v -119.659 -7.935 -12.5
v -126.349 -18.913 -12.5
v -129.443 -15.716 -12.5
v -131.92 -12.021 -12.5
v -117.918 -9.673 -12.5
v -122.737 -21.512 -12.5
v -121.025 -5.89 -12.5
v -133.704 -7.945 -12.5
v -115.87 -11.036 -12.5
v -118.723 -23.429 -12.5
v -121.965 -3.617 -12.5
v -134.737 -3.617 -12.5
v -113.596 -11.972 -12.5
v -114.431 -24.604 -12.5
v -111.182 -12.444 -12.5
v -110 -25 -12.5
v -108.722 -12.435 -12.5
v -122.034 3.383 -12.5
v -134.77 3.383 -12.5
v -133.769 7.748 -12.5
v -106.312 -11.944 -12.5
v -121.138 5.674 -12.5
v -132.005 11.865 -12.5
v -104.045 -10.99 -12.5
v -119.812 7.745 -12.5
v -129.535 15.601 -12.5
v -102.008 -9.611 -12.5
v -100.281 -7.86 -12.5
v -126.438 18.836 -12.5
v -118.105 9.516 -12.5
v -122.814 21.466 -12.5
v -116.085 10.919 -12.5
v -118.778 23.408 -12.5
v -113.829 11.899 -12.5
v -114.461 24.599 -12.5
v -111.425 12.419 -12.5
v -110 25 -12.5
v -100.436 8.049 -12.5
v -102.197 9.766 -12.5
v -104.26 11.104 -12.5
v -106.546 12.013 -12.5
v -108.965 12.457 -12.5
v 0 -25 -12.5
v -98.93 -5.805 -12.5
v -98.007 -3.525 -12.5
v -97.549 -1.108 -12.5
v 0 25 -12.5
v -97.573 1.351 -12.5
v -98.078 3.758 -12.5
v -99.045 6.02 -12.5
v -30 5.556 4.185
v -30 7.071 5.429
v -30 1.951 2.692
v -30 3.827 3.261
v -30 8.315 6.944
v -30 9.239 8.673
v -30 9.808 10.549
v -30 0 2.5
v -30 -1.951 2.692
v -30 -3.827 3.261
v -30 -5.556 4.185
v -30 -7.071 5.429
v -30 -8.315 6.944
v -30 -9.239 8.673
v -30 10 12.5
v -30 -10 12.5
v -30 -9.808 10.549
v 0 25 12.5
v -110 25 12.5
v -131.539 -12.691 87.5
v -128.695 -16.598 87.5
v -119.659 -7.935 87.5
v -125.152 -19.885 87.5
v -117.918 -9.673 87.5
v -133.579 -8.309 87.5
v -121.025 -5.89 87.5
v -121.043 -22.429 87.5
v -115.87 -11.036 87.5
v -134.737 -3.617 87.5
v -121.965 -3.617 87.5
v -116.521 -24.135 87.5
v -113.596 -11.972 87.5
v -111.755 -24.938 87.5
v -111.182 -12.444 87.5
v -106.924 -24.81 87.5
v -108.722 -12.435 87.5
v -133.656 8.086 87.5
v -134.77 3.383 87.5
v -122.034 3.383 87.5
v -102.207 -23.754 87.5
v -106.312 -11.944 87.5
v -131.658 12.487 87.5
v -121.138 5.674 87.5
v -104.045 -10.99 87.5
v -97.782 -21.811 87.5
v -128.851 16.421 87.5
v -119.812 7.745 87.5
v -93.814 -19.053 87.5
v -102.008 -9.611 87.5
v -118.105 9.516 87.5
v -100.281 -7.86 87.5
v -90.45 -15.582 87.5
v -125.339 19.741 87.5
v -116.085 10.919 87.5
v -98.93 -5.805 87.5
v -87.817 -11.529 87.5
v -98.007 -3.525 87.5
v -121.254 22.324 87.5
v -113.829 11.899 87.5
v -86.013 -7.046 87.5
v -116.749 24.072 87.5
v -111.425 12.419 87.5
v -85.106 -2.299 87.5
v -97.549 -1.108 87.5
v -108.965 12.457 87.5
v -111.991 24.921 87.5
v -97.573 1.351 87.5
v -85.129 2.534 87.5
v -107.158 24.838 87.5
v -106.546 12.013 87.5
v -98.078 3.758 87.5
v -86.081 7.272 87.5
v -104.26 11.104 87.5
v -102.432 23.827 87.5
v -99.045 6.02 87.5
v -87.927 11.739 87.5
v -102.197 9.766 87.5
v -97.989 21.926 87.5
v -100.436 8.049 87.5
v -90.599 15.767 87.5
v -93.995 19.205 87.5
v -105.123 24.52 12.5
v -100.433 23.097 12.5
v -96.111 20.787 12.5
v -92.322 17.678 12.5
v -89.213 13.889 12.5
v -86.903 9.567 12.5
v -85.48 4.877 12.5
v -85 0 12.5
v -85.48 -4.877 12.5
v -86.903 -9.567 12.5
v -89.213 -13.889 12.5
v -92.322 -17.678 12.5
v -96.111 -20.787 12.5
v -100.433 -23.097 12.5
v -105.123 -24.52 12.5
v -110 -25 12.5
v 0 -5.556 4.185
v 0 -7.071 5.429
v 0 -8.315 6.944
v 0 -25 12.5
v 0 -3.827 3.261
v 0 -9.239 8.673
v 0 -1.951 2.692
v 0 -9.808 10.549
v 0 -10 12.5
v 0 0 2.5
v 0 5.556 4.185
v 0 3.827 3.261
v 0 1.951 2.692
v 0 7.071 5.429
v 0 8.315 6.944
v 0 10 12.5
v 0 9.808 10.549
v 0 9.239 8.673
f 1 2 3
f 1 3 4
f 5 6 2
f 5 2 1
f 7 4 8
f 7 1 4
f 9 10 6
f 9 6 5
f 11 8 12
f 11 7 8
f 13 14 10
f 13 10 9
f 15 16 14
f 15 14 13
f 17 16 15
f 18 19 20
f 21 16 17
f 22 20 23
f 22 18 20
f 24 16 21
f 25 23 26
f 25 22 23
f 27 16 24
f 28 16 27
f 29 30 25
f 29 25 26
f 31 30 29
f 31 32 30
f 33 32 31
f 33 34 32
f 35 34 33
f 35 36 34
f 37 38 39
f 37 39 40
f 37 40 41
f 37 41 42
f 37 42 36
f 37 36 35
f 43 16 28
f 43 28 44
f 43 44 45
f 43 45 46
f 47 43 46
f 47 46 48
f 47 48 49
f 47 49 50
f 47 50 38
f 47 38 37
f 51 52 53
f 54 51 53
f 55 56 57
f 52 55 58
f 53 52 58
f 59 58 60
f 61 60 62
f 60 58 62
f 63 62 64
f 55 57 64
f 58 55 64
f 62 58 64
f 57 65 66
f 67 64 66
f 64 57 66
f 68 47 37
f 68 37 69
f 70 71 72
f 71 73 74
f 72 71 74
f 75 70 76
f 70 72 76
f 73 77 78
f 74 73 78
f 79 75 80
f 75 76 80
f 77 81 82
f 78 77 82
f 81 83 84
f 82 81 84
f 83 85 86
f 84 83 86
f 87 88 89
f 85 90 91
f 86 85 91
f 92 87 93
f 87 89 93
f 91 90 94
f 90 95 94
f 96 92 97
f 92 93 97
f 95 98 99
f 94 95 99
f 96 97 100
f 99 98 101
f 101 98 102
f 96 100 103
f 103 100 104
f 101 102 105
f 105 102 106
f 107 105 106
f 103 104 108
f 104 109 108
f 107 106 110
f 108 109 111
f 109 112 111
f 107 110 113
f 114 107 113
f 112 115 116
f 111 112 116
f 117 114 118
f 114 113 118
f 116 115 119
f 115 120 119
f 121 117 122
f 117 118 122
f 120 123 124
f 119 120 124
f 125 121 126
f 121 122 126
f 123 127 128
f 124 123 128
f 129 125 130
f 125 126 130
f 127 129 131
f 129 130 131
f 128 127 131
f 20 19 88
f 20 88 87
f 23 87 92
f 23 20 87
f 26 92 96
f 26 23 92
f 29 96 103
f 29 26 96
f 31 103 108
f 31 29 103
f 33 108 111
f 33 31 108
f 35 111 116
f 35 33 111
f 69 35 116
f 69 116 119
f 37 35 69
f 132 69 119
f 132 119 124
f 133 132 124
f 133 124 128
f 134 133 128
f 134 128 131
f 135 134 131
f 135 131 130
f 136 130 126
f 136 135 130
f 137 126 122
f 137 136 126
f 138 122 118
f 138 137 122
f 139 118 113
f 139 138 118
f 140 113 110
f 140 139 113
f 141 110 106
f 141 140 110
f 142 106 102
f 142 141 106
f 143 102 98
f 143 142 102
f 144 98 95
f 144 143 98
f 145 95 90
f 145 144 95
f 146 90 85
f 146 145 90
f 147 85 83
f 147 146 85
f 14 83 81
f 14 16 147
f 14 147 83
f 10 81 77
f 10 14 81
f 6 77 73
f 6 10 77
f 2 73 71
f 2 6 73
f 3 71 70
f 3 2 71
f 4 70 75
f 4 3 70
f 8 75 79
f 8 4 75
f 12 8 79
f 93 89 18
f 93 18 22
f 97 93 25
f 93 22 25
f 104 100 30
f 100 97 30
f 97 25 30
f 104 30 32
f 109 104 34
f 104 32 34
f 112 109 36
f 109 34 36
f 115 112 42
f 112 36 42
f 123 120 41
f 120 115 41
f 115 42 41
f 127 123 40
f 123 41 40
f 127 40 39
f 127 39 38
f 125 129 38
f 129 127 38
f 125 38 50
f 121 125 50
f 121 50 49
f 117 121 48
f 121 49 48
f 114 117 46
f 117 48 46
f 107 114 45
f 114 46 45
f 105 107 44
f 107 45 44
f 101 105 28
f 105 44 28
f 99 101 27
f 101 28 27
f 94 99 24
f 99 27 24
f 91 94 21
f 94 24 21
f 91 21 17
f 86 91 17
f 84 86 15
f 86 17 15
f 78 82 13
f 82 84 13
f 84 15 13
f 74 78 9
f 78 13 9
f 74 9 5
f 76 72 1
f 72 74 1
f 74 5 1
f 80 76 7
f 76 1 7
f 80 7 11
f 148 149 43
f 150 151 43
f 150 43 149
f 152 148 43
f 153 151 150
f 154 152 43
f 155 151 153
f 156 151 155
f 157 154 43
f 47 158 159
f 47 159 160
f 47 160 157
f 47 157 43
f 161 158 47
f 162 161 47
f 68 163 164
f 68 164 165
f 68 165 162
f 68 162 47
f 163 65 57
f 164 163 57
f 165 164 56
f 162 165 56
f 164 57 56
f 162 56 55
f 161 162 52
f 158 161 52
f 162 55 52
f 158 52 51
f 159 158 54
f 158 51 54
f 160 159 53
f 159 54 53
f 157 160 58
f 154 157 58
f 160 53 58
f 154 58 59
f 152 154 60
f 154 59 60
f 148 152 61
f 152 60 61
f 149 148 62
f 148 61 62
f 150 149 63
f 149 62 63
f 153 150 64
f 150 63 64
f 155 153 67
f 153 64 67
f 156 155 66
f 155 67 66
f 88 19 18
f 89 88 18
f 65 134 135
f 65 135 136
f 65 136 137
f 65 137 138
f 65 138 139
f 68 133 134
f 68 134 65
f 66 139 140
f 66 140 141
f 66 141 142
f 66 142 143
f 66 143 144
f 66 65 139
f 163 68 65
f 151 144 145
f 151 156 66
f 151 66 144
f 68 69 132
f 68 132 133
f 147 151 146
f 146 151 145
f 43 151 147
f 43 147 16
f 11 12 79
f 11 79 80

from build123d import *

# Parameters (mm, degrees)
BOSS_EXTRUDE1_DEPTH     = 110
CUT_EXTRUDE1_DEPTH      = 114.495594628
CUT_EXTRUDE1_DEPTH_BACK = 30
SKETCH5_R               = 25
SKETCH5_R_2             = 12.5
BOSS_EXTRUDE2_DEPTH     = 100
CUT_EXTRUDE2_DEPTH      = 170.852877515
CUT_EXTRUDE2_DEPTH_BACK = 170.852877515
SKETCH6_W               = 32.203850694
SKETCH6_H               = 7
CUT_EXTRUDE3_DEPTH      = 170.670177936
CUT_EXTRUDE3_DEPTH_BACK = 170.670177936
SKETCH7_R               = 12.5


with BuildPart() as part:
    # Sketch1 → Boss-Extrude1 (new body)
    with BuildSketch(Plane.YZ):
        with BuildLine():
            ThreePointArc((10, 12.5), (0, 2.5), (-10, 12.5))
            Line((-10, 12.5), (-25, 12.5))
            Line((-25, 12.5), (-25, -12.5))
            Line((-25, -12.5), (25, -12.5))
            Line((25, -12.5), (25, 12.5))
            Line((25, 12.5), (10, 12.5))
        make_face()
        with BuildLine():
            Line((10, 12.5), (-10, 12.5))
            ThreePointArc((-10, 12.5), (0, 2.5), (10, 12.5))
        make_face()
    extrude(amount=-BOSS_EXTRUDE1_DEPTH)

    # Sketch4 → Cut-Extrude1 (cut, two sides: drawn at the far end of the back side and taken through both)
    with BuildSketch(Plane.YZ.offset(-CUT_EXTRUDE1_DEPTH_BACK)):
        with BuildLine():
            Line((-10, 12.5), (10, 12.5))
            ThreePointArc((10, 12.5), (0, 2.5), (-10, 12.5))
        make_face()
    extrude(amount=CUT_EXTRUDE1_DEPTH + CUT_EXTRUDE1_DEPTH_BACK, mode=Mode.SUBTRACT)

    # Sketch5 → Boss-Extrude2 (add)
    with BuildSketch(Plane(origin=(0, 0, -12.5), x_dir=(1, 0, 0), z_dir=(0, 0, -1))):
        with Locations(Location((-110, 0, 0), (0, 0, 270))):
            Circle(SKETCH5_R)
        with Locations(Location((-110, 0, 0), (0, 0, 270))):
            Circle(SKETCH5_R_2, mode=Mode.SUBTRACT)
    extrude(amount=-BOSS_EXTRUDE2_DEPTH)

    # Sketch6 → Cut-Extrude2 (cut, two sides: drawn at the far end of the back side and taken through both)
    with BuildSketch(Plane.XY.offset(87.5).offset(-CUT_EXTRUDE2_DEPTH_BACK)):
        with Locations((-126.101925347, -0.117088635)):
            Rectangle(SKETCH6_W, SKETCH6_H)
    extrude(amount=CUT_EXTRUDE2_DEPTH + CUT_EXTRUDE2_DEPTH_BACK, mode=Mode.SUBTRACT)

    # Sketch7 → Cut-Extrude3 (cut, two sides: drawn at the far end of the back side and taken through both)
    with BuildSketch(Plane.XY.offset(87.5).offset(-CUT_EXTRUDE3_DEPTH_BACK)):
        with Locations((-110, 0)):
            Circle(SKETCH7_R)
    extrude(amount=CUT_EXTRUDE3_DEPTH + CUT_EXTRUDE3_DEPTH_BACK, mode=Mode.SUBTRACT)


solid = part.part
